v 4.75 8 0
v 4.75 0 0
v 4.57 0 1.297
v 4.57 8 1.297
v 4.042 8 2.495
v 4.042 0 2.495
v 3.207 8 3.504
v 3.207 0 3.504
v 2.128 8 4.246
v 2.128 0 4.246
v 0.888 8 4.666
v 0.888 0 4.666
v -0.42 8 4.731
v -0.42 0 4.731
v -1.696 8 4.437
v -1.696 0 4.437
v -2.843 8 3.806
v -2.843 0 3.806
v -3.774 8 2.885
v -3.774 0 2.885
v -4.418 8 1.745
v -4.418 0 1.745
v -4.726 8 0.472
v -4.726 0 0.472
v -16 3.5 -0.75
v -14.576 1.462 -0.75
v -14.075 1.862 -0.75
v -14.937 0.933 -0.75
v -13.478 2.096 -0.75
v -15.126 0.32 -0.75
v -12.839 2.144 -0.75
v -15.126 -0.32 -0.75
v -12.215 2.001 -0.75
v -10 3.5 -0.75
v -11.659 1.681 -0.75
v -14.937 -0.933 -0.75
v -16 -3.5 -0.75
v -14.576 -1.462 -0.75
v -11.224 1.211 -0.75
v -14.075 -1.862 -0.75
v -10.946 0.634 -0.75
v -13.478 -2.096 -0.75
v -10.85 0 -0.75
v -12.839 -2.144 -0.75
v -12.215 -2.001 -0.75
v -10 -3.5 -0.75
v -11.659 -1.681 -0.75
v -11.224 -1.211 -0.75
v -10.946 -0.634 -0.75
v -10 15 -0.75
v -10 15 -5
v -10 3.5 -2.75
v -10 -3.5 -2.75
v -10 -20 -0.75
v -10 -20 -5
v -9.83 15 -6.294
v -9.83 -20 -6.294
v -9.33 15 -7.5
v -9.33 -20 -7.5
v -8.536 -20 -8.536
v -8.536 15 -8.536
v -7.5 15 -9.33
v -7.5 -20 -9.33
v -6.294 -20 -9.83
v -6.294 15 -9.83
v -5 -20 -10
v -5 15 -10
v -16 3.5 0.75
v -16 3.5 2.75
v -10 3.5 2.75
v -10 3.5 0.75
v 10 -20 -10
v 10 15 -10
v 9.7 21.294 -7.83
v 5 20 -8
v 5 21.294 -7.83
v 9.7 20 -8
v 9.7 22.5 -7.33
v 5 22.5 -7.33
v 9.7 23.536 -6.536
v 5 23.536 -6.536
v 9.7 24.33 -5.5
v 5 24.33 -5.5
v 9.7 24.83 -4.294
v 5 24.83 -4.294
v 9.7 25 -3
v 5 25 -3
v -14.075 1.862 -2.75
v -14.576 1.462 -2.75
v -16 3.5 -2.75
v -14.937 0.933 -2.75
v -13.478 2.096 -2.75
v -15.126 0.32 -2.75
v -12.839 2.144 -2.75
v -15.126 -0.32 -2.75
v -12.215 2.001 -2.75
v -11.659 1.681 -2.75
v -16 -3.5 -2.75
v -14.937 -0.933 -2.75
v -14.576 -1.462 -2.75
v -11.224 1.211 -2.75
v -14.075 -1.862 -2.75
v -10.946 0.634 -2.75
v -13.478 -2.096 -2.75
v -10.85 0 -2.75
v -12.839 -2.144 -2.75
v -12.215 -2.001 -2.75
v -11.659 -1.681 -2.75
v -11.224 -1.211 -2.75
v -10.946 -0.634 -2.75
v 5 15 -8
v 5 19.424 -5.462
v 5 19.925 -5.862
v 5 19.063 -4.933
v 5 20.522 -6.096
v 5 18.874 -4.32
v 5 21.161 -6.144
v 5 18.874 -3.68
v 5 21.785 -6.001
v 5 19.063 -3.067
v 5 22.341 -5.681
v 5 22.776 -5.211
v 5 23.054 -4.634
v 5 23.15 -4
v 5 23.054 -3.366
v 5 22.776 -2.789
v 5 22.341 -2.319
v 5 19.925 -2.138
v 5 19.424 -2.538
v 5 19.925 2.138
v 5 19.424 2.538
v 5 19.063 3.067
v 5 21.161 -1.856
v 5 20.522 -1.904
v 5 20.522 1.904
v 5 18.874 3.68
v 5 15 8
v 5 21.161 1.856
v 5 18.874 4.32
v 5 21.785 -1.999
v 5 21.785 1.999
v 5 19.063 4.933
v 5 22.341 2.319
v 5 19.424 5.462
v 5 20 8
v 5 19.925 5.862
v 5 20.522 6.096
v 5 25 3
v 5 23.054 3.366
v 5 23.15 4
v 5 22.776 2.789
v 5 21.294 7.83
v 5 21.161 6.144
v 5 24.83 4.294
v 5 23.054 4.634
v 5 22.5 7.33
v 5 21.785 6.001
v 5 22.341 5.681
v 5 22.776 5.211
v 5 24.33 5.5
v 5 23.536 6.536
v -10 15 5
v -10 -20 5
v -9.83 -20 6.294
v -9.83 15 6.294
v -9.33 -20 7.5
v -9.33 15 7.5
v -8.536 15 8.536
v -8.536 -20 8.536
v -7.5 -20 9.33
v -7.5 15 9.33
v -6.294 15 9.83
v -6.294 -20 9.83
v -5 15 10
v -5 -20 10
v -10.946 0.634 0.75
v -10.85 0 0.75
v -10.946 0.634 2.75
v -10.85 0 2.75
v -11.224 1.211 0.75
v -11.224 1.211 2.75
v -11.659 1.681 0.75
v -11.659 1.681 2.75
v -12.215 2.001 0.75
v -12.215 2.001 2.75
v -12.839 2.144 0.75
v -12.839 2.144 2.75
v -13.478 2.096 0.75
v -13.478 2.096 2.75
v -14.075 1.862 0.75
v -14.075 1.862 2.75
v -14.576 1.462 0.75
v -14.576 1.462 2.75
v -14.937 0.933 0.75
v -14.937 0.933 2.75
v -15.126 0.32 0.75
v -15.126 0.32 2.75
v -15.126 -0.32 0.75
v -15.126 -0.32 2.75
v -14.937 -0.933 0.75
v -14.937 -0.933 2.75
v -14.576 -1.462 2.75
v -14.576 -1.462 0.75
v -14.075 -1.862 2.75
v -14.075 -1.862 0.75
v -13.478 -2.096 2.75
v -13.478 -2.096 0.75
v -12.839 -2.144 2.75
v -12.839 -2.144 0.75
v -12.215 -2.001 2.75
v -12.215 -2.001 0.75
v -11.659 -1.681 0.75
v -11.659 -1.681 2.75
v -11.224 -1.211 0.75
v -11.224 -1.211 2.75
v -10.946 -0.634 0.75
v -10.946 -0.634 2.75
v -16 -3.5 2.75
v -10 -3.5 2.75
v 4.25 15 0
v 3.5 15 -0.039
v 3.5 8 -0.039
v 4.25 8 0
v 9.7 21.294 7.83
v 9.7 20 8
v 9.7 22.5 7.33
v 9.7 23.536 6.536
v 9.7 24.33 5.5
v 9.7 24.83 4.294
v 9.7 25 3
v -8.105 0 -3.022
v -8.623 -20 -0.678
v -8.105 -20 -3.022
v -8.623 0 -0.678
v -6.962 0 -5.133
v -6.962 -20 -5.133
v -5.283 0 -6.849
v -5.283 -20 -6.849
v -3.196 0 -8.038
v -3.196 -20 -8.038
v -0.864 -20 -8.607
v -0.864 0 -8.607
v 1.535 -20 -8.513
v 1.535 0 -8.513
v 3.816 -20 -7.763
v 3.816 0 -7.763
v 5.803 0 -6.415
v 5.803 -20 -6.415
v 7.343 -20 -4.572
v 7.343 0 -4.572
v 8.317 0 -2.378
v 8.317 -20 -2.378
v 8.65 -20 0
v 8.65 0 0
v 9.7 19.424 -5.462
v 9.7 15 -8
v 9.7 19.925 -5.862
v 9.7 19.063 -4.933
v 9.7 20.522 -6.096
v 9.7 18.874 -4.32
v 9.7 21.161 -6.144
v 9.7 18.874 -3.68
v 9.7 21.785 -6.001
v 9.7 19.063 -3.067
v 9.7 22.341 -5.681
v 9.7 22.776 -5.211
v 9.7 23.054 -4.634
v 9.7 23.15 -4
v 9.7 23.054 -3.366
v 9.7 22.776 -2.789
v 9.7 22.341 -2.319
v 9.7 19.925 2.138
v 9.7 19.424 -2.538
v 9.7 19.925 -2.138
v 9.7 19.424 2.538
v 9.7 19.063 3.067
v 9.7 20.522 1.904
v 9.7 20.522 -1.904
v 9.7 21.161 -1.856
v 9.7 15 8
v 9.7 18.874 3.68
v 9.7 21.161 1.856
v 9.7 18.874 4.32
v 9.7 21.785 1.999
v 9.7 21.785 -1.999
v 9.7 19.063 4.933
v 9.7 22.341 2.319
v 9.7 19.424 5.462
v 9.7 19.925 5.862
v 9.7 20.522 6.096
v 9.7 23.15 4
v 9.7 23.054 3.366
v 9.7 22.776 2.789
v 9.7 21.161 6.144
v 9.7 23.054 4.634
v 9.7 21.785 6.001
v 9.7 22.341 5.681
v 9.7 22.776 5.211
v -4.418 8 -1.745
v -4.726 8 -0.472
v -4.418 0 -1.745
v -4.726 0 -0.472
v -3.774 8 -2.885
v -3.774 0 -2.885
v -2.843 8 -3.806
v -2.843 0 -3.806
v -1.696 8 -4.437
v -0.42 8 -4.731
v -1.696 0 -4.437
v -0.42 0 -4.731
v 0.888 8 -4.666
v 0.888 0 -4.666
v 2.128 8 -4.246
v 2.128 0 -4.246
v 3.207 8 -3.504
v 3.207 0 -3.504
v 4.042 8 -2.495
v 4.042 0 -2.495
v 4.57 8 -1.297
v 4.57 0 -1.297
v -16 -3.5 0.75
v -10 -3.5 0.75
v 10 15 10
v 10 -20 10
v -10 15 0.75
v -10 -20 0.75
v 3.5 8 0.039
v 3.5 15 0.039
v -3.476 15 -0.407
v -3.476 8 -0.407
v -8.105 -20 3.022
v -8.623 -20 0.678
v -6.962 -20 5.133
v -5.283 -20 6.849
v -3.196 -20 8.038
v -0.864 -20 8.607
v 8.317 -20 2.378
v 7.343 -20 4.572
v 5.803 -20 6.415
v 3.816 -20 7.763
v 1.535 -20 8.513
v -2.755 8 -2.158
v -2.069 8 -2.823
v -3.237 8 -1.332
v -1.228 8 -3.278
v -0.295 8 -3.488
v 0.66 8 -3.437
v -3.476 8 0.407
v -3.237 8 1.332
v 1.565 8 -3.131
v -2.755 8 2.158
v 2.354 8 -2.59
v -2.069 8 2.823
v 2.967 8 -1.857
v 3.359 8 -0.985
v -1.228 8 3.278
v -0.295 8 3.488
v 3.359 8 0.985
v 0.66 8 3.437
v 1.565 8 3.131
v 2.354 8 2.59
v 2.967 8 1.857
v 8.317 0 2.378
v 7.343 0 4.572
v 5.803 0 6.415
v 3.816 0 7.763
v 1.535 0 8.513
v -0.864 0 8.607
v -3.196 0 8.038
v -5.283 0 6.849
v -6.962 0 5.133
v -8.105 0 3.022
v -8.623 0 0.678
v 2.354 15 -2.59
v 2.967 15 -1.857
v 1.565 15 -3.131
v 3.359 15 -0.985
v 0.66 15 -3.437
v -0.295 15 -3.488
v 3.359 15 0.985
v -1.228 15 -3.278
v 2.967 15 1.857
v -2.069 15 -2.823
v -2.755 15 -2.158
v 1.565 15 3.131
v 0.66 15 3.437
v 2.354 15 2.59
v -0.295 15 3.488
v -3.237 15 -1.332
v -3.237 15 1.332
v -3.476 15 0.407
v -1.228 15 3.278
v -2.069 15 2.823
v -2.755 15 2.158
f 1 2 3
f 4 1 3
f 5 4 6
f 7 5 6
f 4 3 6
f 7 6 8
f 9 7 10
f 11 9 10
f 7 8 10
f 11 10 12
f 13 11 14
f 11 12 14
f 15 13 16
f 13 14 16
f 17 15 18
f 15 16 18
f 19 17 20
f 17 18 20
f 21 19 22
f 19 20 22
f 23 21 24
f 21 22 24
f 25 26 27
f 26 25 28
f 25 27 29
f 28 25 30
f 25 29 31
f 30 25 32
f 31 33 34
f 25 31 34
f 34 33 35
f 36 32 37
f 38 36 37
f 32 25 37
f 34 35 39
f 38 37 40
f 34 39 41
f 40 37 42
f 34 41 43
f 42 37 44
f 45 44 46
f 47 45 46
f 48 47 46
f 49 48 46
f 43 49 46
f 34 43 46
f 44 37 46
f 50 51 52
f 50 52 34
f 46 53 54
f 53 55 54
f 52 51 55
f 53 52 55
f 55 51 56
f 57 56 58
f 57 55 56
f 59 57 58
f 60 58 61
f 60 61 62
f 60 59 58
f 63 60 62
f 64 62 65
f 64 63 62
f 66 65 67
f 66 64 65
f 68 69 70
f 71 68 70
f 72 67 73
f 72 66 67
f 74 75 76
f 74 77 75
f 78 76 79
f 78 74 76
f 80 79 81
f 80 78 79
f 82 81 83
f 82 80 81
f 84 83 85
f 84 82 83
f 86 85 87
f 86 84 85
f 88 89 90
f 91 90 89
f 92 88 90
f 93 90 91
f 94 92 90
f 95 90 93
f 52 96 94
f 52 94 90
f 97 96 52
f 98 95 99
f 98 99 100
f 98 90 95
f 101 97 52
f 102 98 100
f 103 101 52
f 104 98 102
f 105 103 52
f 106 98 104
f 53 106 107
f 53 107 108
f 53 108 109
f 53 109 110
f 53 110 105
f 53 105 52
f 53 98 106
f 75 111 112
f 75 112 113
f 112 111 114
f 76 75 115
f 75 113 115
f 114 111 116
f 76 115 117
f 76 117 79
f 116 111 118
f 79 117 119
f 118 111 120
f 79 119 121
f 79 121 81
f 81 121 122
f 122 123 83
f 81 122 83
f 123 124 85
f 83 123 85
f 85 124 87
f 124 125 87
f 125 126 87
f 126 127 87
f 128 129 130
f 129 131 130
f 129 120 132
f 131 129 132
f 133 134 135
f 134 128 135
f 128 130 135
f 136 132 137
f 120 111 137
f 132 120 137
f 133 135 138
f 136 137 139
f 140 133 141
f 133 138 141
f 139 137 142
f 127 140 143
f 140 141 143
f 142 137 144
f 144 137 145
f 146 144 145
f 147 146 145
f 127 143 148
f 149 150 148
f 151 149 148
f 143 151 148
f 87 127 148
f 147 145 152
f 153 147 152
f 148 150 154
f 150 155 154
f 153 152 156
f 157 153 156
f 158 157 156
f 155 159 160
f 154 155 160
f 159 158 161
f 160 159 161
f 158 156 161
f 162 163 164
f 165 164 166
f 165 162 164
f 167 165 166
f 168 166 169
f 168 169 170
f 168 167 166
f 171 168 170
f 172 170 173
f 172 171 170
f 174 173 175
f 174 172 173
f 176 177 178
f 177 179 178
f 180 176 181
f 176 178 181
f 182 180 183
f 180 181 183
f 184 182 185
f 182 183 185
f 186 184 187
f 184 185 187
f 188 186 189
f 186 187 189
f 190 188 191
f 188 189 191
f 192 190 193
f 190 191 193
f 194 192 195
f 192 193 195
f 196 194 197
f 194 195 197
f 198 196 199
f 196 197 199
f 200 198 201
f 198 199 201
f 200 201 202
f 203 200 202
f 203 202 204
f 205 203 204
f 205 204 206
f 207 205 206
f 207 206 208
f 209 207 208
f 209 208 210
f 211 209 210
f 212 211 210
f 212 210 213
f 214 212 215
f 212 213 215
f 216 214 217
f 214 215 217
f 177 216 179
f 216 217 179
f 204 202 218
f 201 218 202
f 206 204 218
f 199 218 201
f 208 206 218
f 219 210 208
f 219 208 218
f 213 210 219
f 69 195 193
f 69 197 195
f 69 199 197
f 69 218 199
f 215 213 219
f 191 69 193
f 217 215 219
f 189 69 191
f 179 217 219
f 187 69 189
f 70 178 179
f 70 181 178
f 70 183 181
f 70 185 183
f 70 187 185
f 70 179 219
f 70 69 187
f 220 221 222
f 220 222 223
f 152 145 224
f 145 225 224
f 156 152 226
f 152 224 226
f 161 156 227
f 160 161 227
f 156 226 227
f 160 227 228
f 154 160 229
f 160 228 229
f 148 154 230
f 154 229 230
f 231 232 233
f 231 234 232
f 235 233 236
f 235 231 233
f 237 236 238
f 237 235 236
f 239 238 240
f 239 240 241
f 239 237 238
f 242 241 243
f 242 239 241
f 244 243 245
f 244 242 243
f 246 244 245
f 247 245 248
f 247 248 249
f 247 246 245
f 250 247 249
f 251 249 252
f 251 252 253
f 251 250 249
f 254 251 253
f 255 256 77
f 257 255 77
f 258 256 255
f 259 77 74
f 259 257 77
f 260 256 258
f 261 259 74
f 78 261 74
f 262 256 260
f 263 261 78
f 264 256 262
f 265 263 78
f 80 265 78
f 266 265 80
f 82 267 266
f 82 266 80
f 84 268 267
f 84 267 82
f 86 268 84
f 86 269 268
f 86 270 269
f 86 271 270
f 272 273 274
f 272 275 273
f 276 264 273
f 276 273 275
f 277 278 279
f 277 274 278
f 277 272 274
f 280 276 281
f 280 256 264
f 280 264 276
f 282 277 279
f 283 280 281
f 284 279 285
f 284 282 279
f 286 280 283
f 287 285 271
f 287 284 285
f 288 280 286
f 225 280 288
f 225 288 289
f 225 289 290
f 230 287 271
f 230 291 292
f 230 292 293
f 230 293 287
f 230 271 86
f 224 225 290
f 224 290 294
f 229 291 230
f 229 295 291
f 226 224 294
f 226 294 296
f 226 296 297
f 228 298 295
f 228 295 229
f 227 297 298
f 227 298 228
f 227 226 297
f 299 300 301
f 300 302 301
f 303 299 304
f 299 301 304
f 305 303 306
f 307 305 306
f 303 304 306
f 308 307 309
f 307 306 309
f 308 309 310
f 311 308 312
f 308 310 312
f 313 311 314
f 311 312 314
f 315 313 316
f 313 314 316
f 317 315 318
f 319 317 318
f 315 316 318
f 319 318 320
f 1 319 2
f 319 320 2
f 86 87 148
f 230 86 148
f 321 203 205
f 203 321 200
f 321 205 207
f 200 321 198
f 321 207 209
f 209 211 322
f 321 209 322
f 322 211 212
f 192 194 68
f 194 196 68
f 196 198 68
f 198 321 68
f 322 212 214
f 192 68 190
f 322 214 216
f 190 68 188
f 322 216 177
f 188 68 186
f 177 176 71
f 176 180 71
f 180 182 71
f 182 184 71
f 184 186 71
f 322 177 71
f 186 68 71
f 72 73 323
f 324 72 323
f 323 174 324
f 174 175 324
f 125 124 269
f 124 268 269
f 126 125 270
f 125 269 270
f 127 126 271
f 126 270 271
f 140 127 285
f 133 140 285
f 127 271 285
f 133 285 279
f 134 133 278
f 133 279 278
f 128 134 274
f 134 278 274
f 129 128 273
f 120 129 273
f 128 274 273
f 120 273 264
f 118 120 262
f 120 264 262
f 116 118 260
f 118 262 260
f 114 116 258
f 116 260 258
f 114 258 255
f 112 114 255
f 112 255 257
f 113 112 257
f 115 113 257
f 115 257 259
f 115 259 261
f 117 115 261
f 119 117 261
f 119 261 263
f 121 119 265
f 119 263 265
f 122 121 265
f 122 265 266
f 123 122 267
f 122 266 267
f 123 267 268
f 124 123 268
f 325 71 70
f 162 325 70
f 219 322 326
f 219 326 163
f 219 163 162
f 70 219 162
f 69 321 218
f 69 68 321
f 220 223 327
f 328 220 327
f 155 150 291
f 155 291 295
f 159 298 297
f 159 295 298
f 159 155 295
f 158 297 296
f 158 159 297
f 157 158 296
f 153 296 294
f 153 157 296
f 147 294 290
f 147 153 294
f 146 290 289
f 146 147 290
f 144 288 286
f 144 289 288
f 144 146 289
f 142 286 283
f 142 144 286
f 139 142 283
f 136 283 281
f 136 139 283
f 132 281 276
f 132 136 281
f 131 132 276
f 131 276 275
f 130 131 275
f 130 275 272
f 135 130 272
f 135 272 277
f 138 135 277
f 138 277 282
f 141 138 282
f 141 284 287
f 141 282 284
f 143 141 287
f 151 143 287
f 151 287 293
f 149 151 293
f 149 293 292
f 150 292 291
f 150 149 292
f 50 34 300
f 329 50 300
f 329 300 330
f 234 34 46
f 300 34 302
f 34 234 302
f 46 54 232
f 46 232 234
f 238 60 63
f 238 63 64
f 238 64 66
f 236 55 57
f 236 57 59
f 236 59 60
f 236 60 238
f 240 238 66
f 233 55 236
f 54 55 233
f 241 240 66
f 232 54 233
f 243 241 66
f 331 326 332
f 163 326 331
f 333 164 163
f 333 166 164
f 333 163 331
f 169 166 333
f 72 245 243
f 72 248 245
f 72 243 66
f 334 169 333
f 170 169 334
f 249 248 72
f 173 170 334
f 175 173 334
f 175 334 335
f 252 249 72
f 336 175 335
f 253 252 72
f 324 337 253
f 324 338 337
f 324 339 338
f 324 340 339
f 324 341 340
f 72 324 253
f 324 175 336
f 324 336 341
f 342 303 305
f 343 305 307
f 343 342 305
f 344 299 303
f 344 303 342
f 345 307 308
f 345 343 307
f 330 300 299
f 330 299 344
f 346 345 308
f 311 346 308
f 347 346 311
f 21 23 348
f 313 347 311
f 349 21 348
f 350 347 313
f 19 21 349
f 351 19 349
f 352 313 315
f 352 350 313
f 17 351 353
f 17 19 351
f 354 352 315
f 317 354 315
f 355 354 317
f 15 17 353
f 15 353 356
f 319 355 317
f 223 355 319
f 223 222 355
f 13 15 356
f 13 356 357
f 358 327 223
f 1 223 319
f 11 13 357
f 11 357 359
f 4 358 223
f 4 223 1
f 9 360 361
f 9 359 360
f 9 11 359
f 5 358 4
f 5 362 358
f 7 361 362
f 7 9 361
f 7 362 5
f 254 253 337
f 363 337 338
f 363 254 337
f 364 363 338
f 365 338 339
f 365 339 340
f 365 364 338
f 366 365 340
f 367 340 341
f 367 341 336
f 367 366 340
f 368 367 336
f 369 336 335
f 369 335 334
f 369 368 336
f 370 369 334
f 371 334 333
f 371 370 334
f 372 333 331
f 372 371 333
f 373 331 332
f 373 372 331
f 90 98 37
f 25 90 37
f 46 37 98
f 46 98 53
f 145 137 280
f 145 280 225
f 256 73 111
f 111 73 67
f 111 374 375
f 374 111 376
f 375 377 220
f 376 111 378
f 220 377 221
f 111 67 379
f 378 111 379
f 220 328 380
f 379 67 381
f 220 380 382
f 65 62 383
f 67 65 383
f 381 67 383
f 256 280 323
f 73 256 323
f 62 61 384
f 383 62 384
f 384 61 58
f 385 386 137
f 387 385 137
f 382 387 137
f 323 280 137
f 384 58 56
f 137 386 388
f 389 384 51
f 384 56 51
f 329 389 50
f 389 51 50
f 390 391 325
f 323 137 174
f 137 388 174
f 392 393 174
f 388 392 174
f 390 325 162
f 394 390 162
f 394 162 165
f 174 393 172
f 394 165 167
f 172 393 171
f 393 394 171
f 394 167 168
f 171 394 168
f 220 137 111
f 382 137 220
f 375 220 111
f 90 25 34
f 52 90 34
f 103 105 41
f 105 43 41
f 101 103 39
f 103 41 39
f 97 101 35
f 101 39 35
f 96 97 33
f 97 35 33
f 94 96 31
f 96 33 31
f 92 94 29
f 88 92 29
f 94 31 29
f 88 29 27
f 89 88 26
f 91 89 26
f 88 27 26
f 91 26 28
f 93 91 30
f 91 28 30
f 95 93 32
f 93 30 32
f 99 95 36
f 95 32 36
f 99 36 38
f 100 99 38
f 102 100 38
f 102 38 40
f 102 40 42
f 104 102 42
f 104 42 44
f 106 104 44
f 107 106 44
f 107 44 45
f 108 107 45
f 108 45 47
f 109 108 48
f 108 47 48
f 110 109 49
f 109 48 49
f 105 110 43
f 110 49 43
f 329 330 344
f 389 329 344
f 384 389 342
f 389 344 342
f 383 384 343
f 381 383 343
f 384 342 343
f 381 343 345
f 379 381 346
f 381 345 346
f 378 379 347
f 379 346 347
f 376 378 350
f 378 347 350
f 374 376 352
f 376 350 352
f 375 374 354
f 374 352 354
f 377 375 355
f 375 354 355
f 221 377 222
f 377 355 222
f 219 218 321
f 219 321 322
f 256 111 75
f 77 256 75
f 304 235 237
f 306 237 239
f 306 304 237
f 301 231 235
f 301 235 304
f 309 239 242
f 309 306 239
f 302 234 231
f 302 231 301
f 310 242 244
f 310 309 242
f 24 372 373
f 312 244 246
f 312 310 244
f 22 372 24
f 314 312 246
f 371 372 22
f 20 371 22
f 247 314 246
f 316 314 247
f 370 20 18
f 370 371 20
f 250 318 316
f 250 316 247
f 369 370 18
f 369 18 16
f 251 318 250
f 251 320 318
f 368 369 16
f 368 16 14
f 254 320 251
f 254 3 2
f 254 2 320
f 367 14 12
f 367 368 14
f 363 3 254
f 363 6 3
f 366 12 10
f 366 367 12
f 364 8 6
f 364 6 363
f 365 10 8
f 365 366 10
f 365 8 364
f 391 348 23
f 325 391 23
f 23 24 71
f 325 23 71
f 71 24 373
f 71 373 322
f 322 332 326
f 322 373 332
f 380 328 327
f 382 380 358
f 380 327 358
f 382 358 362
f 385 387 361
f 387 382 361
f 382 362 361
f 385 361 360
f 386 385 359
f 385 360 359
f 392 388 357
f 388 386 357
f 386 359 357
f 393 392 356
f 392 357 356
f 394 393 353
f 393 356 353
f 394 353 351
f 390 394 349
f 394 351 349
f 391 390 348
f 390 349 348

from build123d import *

# Parameters (mm, degrees)
F0_W      = 20
F0_H      = 20
F0_R      = 8.65
F1_DEPTH  = 20
F2_W      = 20
F2_H      = 20
F3_DEPTH  = 15
F4_R      = 4.75
F5_DEPTH  = 8
F6_R      = 2.075
F7_DEPTH  = 11
F9_DEPTH  = 25.3
F10_W     = 6
F10_H     = 2
F11_DEPTH = 3.5
F12_R     = 2.15
F13_DEPTH = 5.23
F14_R     = 1.65
F15_DEPTH = 6.34
F16_R     = 3.5
F17_DEPTH = 31.8
F18_R     = 5
F20_W     = 10
F20_H     = 16
F21_DEPTH = 9.7
F22_DEPTH = 5
F23_R     = 2.15
F24_DEPTH = 12.5
F25_R     = 5


with BuildPart() as f1:
    # F0 (on Front) → F1 (new body)
    with BuildSketch(Plane.XZ):
        Rectangle(F0_W, F0_H)
        Circle(F0_R, mode=Mode.SUBTRACT)
    extrude(amount=F1_DEPTH)

    # F2 (on Front) → F3 (join)
    with BuildSketch(Plane.XZ):
        Rectangle(F2_W, F2_H)
    extrude(amount=-F3_DEPTH)

    # F4 (on Front) → F5 (cut)
    with BuildSketch(Plane.XZ):
        Circle(F4_R)
    extrude(amount=-F5_DEPTH, mode=Mode.SUBTRACT)

    # F6 (on Front) → F7 (cut)
    with BuildSketch(Plane.XZ):
        Circle(F6_R)
    extrude(amount=-F7_DEPTH, mode=Mode.SUBTRACT)

    # F8 (on Front) → F9 (cut, symmetric)
    with BuildSketch(Plane.XZ):
        Polygon((4.25, 0), (-10, 0.75), (-10, -0.75), align=None)
    extrude(amount=F9_DEPTH, both=True, mode=Mode.SUBTRACT)

    # F10 (on Front) → F11 (join, symmetric)
    with BuildSketch(Plane.XZ):
        with Locations((-13, 1.75)):
            Rectangle(F10_W, F10_H)
        with Locations((-13, -1.75)):
            Rectangle(F10_W, F10_H)
    extrude(amount=F11_DEPTH, both=True)

    # F12 (on Top) → F13 (cut, symmetric)
    with BuildSketch(Plane.XY):
        with Locations((-13, 0)):
            Circle(F12_R)
    extrude(amount=F13_DEPTH, both=True, mode=Mode.SUBTRACT)

    # F14 (on Top) → F15 (cut)
    with BuildSketch(Plane.XY):
        with Locations((-13, 0)):
            Circle(F14_R)
    extrude(amount=-F15_DEPTH, mode=Mode.SUBTRACT)

    # F16 (on Front) → F17 (cut)
    with BuildSketch(Plane.XZ):
        Circle(F16_R)
    extrude(amount=-F17_DEPTH, mode=Mode.SUBTRACT)

    # F18
    f18_edges = [f1.edges().sort_by_distance(p)[0] for p in [
        (-10, -2.5, -10),
        (-10, -2.5, 10),
    ]]
    fillet(f18_edges, radius=F18_R)

    # F20 (on Right) → F21 (join)
    with BuildSketch(Plane.YZ):
        with Locations((20, 0)):
            Rectangle(F20_W, F20_H)
    extrude(amount=F21_DEPTH)

    # F20 (on Right) → F22 (cut)
    with BuildSketch(Plane.YZ):
        with Locations((20, 0)):
            Rectangle(F20_W, F20_H)
    extrude(amount=F22_DEPTH, mode=Mode.SUBTRACT)

    # F23 (on face) → F24 (cut, symmetric)
    with BuildSketch(Plane.YZ):
        with Locations((21, 4)):
            Circle(F23_R)
        with Locations((21, -4)):
            Circle(F23_R)
    extrude(amount=F24_DEPTH, both=True, mode=Mode.SUBTRACT)

    # F25
    f25_edges = [f1.edges().sort_by_distance(p)[0] for p in [
        (7.35, 25, -8),
        (7.35, 25, 8),
    ]]
    fillet(f25_edges, radius=F25_R)


solid = f1.part
